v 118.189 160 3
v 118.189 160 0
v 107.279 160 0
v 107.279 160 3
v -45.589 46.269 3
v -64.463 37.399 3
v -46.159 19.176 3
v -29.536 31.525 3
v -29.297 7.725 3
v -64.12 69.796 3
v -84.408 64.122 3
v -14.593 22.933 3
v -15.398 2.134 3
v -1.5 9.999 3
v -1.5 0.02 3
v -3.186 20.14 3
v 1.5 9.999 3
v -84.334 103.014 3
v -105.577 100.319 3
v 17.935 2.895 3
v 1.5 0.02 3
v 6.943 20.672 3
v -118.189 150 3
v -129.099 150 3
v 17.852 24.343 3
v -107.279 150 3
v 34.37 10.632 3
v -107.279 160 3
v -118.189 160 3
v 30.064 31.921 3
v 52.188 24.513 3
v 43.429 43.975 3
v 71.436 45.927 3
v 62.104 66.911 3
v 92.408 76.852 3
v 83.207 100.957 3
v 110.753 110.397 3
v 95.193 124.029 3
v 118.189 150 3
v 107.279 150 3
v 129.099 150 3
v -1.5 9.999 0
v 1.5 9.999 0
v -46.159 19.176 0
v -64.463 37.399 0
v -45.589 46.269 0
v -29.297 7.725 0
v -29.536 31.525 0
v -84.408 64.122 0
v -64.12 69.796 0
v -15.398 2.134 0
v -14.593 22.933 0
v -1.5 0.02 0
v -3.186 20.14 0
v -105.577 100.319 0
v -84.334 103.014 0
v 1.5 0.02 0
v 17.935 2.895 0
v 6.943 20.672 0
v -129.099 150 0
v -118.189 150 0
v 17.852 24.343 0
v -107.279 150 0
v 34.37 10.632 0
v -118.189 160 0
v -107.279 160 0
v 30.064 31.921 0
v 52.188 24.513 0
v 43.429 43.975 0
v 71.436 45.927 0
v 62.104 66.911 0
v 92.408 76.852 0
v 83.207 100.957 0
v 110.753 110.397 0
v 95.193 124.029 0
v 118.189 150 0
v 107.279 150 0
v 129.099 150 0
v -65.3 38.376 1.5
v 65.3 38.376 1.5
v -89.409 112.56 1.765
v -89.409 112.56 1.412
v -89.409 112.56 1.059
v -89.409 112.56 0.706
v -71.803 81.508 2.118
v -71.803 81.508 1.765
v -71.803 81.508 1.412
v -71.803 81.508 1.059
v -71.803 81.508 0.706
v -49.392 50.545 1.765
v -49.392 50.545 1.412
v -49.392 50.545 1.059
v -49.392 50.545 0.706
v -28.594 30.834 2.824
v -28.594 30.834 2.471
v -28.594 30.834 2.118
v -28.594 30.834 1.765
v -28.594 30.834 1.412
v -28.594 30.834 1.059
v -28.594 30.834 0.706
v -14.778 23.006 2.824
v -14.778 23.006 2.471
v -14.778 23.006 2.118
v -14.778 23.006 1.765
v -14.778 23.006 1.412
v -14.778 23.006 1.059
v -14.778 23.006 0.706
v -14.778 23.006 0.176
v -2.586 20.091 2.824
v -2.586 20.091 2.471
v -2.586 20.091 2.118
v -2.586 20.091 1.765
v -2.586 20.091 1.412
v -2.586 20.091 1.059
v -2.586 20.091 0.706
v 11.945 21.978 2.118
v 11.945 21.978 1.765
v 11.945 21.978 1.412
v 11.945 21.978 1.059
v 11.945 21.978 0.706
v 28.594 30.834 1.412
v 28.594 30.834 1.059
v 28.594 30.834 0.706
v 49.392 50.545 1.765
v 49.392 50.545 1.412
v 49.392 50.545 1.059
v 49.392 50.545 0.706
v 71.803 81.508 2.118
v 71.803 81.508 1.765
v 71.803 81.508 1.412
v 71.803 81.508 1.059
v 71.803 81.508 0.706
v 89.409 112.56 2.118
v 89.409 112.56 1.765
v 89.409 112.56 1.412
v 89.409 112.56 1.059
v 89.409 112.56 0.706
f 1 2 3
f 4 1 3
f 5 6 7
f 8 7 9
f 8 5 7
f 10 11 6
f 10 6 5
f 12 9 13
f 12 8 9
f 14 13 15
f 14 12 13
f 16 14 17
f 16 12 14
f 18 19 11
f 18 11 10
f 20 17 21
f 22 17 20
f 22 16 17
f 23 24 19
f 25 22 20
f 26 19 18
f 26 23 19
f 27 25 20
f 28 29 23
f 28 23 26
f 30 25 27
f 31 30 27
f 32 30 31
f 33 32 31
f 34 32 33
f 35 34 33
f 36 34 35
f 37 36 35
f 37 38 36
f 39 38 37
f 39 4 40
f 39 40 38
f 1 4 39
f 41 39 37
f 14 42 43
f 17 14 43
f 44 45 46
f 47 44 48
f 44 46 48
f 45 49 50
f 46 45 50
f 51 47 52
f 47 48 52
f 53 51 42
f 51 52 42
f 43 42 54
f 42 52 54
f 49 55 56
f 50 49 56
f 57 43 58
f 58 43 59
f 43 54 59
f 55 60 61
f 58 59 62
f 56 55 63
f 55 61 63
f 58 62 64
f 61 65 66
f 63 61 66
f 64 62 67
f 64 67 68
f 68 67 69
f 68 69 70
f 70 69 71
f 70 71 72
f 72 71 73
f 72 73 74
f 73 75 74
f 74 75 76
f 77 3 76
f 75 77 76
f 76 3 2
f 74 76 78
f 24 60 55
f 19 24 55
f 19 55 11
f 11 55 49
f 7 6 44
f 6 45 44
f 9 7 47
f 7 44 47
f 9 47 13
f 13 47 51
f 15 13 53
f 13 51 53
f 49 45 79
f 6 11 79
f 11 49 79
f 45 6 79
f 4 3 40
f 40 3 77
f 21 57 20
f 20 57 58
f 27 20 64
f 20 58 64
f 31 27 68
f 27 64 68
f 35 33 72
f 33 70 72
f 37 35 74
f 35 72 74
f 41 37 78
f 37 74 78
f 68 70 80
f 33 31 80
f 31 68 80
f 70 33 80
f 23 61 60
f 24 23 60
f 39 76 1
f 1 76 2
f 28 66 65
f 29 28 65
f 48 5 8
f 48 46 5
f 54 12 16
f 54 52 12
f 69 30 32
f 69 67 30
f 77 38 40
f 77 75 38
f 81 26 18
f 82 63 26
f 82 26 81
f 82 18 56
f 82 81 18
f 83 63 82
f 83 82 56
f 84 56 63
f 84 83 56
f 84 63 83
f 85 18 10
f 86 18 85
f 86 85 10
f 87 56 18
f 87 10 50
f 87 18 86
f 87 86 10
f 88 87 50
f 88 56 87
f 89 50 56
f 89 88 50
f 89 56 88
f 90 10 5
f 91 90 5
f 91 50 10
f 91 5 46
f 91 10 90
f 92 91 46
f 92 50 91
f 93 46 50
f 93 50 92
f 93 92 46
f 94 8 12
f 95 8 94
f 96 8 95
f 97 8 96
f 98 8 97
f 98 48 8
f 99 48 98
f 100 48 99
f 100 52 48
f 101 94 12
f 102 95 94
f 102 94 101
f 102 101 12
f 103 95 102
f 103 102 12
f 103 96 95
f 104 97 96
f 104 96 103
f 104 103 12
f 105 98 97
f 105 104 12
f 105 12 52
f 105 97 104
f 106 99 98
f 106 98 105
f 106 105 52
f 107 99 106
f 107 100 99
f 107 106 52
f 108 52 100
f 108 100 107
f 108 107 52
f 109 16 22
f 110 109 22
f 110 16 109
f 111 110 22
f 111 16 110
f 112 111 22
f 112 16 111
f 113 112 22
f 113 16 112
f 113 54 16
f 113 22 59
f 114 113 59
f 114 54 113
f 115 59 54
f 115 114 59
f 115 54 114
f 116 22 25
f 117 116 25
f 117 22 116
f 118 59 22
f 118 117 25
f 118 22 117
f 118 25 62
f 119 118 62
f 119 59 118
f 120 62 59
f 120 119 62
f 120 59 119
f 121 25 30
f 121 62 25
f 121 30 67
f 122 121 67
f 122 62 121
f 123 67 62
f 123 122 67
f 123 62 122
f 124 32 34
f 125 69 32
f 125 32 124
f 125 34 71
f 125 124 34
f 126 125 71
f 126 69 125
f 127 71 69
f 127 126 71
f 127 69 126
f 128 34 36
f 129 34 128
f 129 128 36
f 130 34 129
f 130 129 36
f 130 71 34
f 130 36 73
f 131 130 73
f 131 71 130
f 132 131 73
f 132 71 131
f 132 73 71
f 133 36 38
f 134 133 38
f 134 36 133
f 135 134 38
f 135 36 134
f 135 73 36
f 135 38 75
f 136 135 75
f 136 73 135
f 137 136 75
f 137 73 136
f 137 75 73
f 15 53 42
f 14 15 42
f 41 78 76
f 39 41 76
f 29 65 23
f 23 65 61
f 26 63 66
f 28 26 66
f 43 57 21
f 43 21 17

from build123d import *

# Parameters (mm, degrees)
BOSS_EXTRUDE1_DEPTH = 3
SKETCH4_W           = 2.999863356
SKETCH4_H           = 9.998922379
CUT_EXTRUDE1_DEPTH  = 59


# Read off the part's stored shape, not the designer's step: Boss-Extrude1
with BuildPart() as part:
    # Boss-Extrude1 outline → Boss-Extrude1 (new body)
    with BuildSketch(Plane.XY):
        with BuildLine():
            Line((-118.189248577, 160.000000006), (-118.189248577, 150.000000006))
            Line((-118.189248577, 150.000000006), (-129.099444876, 150.000000006))
            add(Edge.make_bspline(
                [(-129.099444876, 150.000000006), (-3e-09, -149.999999999), (129.099444871, 149.999999993)],
                knots=[0.05395051, 0.05395051, 0.05395051, 0.94604949, 0.94604949, 0.94604949], degree=2))
            Line((129.099444871, 149.999999993), (118.189248572, 149.999999993))
            Line((118.189248572, 149.999999993), (118.189248572, 159.999999993))
            Line((118.189248572, 159.999999993), (107.279052273, 159.999999993))
            Line((107.279052273, 159.999999993), (107.279052273, 149.999999993))
            add(Edge.make_bspline(
                [(-107.279052278, 150.000000004), (-97.183104825, 127.186517466), (-79.444733684, 93.708440604), (-64.161675128, 69.308365489), (-49.305393546, 49.915770109), (-35.13866486, 35.555231256), (-22.048355535, 26.113129248), (-11.855422137, 21.724421759), (-5.17246227, 20.278244385), (-2e-09, 19.904378215), (5.172462266, 20.278244384), (11.855422133, 21.724421758), (22.048355531, 26.113129246), (35.138664855, 35.555231252), (49.305393541, 49.915770103), (64.161675123, 69.308365482), (79.444733679, 93.708440595), (97.18310482, 127.186517456), (107.279052273, 149.999999993)],
                knots=[0.066145022, 0.066145022, 0.066145022, 0.13758479, 0.193340976, 0.249097162, 0.304853348, 0.360609534, 0.416365721, 0.45818286, 0.486060953, 0.513939047, 0.54181714, 0.583634279, 0.639390465, 0.695146652, 0.750902838, 0.806659024, 0.86241521, 0.933854978, 0.933854978, 0.933854978], degree=2))
            Line((-107.279052278, 150.000000004), (-107.279052278, 160.000000006))
            Line((-107.279052278, 160.000000006), (-118.189248577, 160.000000006))
        make_face()
    extrude(amount=BOSS_EXTRUDE1_DEPTH)

    # Sketch4 → Cut-Extrude1 (cut)
    with BuildSketch(Plane.XY):
        with Locations((6.8322e-05, 4.99946119)):
            Rectangle(SKETCH4_W, SKETCH4_H)
    extrude(amount=CUT_EXTRUDE1_DEPTH, mode=Mode.SUBTRACT)


solid = part.part
